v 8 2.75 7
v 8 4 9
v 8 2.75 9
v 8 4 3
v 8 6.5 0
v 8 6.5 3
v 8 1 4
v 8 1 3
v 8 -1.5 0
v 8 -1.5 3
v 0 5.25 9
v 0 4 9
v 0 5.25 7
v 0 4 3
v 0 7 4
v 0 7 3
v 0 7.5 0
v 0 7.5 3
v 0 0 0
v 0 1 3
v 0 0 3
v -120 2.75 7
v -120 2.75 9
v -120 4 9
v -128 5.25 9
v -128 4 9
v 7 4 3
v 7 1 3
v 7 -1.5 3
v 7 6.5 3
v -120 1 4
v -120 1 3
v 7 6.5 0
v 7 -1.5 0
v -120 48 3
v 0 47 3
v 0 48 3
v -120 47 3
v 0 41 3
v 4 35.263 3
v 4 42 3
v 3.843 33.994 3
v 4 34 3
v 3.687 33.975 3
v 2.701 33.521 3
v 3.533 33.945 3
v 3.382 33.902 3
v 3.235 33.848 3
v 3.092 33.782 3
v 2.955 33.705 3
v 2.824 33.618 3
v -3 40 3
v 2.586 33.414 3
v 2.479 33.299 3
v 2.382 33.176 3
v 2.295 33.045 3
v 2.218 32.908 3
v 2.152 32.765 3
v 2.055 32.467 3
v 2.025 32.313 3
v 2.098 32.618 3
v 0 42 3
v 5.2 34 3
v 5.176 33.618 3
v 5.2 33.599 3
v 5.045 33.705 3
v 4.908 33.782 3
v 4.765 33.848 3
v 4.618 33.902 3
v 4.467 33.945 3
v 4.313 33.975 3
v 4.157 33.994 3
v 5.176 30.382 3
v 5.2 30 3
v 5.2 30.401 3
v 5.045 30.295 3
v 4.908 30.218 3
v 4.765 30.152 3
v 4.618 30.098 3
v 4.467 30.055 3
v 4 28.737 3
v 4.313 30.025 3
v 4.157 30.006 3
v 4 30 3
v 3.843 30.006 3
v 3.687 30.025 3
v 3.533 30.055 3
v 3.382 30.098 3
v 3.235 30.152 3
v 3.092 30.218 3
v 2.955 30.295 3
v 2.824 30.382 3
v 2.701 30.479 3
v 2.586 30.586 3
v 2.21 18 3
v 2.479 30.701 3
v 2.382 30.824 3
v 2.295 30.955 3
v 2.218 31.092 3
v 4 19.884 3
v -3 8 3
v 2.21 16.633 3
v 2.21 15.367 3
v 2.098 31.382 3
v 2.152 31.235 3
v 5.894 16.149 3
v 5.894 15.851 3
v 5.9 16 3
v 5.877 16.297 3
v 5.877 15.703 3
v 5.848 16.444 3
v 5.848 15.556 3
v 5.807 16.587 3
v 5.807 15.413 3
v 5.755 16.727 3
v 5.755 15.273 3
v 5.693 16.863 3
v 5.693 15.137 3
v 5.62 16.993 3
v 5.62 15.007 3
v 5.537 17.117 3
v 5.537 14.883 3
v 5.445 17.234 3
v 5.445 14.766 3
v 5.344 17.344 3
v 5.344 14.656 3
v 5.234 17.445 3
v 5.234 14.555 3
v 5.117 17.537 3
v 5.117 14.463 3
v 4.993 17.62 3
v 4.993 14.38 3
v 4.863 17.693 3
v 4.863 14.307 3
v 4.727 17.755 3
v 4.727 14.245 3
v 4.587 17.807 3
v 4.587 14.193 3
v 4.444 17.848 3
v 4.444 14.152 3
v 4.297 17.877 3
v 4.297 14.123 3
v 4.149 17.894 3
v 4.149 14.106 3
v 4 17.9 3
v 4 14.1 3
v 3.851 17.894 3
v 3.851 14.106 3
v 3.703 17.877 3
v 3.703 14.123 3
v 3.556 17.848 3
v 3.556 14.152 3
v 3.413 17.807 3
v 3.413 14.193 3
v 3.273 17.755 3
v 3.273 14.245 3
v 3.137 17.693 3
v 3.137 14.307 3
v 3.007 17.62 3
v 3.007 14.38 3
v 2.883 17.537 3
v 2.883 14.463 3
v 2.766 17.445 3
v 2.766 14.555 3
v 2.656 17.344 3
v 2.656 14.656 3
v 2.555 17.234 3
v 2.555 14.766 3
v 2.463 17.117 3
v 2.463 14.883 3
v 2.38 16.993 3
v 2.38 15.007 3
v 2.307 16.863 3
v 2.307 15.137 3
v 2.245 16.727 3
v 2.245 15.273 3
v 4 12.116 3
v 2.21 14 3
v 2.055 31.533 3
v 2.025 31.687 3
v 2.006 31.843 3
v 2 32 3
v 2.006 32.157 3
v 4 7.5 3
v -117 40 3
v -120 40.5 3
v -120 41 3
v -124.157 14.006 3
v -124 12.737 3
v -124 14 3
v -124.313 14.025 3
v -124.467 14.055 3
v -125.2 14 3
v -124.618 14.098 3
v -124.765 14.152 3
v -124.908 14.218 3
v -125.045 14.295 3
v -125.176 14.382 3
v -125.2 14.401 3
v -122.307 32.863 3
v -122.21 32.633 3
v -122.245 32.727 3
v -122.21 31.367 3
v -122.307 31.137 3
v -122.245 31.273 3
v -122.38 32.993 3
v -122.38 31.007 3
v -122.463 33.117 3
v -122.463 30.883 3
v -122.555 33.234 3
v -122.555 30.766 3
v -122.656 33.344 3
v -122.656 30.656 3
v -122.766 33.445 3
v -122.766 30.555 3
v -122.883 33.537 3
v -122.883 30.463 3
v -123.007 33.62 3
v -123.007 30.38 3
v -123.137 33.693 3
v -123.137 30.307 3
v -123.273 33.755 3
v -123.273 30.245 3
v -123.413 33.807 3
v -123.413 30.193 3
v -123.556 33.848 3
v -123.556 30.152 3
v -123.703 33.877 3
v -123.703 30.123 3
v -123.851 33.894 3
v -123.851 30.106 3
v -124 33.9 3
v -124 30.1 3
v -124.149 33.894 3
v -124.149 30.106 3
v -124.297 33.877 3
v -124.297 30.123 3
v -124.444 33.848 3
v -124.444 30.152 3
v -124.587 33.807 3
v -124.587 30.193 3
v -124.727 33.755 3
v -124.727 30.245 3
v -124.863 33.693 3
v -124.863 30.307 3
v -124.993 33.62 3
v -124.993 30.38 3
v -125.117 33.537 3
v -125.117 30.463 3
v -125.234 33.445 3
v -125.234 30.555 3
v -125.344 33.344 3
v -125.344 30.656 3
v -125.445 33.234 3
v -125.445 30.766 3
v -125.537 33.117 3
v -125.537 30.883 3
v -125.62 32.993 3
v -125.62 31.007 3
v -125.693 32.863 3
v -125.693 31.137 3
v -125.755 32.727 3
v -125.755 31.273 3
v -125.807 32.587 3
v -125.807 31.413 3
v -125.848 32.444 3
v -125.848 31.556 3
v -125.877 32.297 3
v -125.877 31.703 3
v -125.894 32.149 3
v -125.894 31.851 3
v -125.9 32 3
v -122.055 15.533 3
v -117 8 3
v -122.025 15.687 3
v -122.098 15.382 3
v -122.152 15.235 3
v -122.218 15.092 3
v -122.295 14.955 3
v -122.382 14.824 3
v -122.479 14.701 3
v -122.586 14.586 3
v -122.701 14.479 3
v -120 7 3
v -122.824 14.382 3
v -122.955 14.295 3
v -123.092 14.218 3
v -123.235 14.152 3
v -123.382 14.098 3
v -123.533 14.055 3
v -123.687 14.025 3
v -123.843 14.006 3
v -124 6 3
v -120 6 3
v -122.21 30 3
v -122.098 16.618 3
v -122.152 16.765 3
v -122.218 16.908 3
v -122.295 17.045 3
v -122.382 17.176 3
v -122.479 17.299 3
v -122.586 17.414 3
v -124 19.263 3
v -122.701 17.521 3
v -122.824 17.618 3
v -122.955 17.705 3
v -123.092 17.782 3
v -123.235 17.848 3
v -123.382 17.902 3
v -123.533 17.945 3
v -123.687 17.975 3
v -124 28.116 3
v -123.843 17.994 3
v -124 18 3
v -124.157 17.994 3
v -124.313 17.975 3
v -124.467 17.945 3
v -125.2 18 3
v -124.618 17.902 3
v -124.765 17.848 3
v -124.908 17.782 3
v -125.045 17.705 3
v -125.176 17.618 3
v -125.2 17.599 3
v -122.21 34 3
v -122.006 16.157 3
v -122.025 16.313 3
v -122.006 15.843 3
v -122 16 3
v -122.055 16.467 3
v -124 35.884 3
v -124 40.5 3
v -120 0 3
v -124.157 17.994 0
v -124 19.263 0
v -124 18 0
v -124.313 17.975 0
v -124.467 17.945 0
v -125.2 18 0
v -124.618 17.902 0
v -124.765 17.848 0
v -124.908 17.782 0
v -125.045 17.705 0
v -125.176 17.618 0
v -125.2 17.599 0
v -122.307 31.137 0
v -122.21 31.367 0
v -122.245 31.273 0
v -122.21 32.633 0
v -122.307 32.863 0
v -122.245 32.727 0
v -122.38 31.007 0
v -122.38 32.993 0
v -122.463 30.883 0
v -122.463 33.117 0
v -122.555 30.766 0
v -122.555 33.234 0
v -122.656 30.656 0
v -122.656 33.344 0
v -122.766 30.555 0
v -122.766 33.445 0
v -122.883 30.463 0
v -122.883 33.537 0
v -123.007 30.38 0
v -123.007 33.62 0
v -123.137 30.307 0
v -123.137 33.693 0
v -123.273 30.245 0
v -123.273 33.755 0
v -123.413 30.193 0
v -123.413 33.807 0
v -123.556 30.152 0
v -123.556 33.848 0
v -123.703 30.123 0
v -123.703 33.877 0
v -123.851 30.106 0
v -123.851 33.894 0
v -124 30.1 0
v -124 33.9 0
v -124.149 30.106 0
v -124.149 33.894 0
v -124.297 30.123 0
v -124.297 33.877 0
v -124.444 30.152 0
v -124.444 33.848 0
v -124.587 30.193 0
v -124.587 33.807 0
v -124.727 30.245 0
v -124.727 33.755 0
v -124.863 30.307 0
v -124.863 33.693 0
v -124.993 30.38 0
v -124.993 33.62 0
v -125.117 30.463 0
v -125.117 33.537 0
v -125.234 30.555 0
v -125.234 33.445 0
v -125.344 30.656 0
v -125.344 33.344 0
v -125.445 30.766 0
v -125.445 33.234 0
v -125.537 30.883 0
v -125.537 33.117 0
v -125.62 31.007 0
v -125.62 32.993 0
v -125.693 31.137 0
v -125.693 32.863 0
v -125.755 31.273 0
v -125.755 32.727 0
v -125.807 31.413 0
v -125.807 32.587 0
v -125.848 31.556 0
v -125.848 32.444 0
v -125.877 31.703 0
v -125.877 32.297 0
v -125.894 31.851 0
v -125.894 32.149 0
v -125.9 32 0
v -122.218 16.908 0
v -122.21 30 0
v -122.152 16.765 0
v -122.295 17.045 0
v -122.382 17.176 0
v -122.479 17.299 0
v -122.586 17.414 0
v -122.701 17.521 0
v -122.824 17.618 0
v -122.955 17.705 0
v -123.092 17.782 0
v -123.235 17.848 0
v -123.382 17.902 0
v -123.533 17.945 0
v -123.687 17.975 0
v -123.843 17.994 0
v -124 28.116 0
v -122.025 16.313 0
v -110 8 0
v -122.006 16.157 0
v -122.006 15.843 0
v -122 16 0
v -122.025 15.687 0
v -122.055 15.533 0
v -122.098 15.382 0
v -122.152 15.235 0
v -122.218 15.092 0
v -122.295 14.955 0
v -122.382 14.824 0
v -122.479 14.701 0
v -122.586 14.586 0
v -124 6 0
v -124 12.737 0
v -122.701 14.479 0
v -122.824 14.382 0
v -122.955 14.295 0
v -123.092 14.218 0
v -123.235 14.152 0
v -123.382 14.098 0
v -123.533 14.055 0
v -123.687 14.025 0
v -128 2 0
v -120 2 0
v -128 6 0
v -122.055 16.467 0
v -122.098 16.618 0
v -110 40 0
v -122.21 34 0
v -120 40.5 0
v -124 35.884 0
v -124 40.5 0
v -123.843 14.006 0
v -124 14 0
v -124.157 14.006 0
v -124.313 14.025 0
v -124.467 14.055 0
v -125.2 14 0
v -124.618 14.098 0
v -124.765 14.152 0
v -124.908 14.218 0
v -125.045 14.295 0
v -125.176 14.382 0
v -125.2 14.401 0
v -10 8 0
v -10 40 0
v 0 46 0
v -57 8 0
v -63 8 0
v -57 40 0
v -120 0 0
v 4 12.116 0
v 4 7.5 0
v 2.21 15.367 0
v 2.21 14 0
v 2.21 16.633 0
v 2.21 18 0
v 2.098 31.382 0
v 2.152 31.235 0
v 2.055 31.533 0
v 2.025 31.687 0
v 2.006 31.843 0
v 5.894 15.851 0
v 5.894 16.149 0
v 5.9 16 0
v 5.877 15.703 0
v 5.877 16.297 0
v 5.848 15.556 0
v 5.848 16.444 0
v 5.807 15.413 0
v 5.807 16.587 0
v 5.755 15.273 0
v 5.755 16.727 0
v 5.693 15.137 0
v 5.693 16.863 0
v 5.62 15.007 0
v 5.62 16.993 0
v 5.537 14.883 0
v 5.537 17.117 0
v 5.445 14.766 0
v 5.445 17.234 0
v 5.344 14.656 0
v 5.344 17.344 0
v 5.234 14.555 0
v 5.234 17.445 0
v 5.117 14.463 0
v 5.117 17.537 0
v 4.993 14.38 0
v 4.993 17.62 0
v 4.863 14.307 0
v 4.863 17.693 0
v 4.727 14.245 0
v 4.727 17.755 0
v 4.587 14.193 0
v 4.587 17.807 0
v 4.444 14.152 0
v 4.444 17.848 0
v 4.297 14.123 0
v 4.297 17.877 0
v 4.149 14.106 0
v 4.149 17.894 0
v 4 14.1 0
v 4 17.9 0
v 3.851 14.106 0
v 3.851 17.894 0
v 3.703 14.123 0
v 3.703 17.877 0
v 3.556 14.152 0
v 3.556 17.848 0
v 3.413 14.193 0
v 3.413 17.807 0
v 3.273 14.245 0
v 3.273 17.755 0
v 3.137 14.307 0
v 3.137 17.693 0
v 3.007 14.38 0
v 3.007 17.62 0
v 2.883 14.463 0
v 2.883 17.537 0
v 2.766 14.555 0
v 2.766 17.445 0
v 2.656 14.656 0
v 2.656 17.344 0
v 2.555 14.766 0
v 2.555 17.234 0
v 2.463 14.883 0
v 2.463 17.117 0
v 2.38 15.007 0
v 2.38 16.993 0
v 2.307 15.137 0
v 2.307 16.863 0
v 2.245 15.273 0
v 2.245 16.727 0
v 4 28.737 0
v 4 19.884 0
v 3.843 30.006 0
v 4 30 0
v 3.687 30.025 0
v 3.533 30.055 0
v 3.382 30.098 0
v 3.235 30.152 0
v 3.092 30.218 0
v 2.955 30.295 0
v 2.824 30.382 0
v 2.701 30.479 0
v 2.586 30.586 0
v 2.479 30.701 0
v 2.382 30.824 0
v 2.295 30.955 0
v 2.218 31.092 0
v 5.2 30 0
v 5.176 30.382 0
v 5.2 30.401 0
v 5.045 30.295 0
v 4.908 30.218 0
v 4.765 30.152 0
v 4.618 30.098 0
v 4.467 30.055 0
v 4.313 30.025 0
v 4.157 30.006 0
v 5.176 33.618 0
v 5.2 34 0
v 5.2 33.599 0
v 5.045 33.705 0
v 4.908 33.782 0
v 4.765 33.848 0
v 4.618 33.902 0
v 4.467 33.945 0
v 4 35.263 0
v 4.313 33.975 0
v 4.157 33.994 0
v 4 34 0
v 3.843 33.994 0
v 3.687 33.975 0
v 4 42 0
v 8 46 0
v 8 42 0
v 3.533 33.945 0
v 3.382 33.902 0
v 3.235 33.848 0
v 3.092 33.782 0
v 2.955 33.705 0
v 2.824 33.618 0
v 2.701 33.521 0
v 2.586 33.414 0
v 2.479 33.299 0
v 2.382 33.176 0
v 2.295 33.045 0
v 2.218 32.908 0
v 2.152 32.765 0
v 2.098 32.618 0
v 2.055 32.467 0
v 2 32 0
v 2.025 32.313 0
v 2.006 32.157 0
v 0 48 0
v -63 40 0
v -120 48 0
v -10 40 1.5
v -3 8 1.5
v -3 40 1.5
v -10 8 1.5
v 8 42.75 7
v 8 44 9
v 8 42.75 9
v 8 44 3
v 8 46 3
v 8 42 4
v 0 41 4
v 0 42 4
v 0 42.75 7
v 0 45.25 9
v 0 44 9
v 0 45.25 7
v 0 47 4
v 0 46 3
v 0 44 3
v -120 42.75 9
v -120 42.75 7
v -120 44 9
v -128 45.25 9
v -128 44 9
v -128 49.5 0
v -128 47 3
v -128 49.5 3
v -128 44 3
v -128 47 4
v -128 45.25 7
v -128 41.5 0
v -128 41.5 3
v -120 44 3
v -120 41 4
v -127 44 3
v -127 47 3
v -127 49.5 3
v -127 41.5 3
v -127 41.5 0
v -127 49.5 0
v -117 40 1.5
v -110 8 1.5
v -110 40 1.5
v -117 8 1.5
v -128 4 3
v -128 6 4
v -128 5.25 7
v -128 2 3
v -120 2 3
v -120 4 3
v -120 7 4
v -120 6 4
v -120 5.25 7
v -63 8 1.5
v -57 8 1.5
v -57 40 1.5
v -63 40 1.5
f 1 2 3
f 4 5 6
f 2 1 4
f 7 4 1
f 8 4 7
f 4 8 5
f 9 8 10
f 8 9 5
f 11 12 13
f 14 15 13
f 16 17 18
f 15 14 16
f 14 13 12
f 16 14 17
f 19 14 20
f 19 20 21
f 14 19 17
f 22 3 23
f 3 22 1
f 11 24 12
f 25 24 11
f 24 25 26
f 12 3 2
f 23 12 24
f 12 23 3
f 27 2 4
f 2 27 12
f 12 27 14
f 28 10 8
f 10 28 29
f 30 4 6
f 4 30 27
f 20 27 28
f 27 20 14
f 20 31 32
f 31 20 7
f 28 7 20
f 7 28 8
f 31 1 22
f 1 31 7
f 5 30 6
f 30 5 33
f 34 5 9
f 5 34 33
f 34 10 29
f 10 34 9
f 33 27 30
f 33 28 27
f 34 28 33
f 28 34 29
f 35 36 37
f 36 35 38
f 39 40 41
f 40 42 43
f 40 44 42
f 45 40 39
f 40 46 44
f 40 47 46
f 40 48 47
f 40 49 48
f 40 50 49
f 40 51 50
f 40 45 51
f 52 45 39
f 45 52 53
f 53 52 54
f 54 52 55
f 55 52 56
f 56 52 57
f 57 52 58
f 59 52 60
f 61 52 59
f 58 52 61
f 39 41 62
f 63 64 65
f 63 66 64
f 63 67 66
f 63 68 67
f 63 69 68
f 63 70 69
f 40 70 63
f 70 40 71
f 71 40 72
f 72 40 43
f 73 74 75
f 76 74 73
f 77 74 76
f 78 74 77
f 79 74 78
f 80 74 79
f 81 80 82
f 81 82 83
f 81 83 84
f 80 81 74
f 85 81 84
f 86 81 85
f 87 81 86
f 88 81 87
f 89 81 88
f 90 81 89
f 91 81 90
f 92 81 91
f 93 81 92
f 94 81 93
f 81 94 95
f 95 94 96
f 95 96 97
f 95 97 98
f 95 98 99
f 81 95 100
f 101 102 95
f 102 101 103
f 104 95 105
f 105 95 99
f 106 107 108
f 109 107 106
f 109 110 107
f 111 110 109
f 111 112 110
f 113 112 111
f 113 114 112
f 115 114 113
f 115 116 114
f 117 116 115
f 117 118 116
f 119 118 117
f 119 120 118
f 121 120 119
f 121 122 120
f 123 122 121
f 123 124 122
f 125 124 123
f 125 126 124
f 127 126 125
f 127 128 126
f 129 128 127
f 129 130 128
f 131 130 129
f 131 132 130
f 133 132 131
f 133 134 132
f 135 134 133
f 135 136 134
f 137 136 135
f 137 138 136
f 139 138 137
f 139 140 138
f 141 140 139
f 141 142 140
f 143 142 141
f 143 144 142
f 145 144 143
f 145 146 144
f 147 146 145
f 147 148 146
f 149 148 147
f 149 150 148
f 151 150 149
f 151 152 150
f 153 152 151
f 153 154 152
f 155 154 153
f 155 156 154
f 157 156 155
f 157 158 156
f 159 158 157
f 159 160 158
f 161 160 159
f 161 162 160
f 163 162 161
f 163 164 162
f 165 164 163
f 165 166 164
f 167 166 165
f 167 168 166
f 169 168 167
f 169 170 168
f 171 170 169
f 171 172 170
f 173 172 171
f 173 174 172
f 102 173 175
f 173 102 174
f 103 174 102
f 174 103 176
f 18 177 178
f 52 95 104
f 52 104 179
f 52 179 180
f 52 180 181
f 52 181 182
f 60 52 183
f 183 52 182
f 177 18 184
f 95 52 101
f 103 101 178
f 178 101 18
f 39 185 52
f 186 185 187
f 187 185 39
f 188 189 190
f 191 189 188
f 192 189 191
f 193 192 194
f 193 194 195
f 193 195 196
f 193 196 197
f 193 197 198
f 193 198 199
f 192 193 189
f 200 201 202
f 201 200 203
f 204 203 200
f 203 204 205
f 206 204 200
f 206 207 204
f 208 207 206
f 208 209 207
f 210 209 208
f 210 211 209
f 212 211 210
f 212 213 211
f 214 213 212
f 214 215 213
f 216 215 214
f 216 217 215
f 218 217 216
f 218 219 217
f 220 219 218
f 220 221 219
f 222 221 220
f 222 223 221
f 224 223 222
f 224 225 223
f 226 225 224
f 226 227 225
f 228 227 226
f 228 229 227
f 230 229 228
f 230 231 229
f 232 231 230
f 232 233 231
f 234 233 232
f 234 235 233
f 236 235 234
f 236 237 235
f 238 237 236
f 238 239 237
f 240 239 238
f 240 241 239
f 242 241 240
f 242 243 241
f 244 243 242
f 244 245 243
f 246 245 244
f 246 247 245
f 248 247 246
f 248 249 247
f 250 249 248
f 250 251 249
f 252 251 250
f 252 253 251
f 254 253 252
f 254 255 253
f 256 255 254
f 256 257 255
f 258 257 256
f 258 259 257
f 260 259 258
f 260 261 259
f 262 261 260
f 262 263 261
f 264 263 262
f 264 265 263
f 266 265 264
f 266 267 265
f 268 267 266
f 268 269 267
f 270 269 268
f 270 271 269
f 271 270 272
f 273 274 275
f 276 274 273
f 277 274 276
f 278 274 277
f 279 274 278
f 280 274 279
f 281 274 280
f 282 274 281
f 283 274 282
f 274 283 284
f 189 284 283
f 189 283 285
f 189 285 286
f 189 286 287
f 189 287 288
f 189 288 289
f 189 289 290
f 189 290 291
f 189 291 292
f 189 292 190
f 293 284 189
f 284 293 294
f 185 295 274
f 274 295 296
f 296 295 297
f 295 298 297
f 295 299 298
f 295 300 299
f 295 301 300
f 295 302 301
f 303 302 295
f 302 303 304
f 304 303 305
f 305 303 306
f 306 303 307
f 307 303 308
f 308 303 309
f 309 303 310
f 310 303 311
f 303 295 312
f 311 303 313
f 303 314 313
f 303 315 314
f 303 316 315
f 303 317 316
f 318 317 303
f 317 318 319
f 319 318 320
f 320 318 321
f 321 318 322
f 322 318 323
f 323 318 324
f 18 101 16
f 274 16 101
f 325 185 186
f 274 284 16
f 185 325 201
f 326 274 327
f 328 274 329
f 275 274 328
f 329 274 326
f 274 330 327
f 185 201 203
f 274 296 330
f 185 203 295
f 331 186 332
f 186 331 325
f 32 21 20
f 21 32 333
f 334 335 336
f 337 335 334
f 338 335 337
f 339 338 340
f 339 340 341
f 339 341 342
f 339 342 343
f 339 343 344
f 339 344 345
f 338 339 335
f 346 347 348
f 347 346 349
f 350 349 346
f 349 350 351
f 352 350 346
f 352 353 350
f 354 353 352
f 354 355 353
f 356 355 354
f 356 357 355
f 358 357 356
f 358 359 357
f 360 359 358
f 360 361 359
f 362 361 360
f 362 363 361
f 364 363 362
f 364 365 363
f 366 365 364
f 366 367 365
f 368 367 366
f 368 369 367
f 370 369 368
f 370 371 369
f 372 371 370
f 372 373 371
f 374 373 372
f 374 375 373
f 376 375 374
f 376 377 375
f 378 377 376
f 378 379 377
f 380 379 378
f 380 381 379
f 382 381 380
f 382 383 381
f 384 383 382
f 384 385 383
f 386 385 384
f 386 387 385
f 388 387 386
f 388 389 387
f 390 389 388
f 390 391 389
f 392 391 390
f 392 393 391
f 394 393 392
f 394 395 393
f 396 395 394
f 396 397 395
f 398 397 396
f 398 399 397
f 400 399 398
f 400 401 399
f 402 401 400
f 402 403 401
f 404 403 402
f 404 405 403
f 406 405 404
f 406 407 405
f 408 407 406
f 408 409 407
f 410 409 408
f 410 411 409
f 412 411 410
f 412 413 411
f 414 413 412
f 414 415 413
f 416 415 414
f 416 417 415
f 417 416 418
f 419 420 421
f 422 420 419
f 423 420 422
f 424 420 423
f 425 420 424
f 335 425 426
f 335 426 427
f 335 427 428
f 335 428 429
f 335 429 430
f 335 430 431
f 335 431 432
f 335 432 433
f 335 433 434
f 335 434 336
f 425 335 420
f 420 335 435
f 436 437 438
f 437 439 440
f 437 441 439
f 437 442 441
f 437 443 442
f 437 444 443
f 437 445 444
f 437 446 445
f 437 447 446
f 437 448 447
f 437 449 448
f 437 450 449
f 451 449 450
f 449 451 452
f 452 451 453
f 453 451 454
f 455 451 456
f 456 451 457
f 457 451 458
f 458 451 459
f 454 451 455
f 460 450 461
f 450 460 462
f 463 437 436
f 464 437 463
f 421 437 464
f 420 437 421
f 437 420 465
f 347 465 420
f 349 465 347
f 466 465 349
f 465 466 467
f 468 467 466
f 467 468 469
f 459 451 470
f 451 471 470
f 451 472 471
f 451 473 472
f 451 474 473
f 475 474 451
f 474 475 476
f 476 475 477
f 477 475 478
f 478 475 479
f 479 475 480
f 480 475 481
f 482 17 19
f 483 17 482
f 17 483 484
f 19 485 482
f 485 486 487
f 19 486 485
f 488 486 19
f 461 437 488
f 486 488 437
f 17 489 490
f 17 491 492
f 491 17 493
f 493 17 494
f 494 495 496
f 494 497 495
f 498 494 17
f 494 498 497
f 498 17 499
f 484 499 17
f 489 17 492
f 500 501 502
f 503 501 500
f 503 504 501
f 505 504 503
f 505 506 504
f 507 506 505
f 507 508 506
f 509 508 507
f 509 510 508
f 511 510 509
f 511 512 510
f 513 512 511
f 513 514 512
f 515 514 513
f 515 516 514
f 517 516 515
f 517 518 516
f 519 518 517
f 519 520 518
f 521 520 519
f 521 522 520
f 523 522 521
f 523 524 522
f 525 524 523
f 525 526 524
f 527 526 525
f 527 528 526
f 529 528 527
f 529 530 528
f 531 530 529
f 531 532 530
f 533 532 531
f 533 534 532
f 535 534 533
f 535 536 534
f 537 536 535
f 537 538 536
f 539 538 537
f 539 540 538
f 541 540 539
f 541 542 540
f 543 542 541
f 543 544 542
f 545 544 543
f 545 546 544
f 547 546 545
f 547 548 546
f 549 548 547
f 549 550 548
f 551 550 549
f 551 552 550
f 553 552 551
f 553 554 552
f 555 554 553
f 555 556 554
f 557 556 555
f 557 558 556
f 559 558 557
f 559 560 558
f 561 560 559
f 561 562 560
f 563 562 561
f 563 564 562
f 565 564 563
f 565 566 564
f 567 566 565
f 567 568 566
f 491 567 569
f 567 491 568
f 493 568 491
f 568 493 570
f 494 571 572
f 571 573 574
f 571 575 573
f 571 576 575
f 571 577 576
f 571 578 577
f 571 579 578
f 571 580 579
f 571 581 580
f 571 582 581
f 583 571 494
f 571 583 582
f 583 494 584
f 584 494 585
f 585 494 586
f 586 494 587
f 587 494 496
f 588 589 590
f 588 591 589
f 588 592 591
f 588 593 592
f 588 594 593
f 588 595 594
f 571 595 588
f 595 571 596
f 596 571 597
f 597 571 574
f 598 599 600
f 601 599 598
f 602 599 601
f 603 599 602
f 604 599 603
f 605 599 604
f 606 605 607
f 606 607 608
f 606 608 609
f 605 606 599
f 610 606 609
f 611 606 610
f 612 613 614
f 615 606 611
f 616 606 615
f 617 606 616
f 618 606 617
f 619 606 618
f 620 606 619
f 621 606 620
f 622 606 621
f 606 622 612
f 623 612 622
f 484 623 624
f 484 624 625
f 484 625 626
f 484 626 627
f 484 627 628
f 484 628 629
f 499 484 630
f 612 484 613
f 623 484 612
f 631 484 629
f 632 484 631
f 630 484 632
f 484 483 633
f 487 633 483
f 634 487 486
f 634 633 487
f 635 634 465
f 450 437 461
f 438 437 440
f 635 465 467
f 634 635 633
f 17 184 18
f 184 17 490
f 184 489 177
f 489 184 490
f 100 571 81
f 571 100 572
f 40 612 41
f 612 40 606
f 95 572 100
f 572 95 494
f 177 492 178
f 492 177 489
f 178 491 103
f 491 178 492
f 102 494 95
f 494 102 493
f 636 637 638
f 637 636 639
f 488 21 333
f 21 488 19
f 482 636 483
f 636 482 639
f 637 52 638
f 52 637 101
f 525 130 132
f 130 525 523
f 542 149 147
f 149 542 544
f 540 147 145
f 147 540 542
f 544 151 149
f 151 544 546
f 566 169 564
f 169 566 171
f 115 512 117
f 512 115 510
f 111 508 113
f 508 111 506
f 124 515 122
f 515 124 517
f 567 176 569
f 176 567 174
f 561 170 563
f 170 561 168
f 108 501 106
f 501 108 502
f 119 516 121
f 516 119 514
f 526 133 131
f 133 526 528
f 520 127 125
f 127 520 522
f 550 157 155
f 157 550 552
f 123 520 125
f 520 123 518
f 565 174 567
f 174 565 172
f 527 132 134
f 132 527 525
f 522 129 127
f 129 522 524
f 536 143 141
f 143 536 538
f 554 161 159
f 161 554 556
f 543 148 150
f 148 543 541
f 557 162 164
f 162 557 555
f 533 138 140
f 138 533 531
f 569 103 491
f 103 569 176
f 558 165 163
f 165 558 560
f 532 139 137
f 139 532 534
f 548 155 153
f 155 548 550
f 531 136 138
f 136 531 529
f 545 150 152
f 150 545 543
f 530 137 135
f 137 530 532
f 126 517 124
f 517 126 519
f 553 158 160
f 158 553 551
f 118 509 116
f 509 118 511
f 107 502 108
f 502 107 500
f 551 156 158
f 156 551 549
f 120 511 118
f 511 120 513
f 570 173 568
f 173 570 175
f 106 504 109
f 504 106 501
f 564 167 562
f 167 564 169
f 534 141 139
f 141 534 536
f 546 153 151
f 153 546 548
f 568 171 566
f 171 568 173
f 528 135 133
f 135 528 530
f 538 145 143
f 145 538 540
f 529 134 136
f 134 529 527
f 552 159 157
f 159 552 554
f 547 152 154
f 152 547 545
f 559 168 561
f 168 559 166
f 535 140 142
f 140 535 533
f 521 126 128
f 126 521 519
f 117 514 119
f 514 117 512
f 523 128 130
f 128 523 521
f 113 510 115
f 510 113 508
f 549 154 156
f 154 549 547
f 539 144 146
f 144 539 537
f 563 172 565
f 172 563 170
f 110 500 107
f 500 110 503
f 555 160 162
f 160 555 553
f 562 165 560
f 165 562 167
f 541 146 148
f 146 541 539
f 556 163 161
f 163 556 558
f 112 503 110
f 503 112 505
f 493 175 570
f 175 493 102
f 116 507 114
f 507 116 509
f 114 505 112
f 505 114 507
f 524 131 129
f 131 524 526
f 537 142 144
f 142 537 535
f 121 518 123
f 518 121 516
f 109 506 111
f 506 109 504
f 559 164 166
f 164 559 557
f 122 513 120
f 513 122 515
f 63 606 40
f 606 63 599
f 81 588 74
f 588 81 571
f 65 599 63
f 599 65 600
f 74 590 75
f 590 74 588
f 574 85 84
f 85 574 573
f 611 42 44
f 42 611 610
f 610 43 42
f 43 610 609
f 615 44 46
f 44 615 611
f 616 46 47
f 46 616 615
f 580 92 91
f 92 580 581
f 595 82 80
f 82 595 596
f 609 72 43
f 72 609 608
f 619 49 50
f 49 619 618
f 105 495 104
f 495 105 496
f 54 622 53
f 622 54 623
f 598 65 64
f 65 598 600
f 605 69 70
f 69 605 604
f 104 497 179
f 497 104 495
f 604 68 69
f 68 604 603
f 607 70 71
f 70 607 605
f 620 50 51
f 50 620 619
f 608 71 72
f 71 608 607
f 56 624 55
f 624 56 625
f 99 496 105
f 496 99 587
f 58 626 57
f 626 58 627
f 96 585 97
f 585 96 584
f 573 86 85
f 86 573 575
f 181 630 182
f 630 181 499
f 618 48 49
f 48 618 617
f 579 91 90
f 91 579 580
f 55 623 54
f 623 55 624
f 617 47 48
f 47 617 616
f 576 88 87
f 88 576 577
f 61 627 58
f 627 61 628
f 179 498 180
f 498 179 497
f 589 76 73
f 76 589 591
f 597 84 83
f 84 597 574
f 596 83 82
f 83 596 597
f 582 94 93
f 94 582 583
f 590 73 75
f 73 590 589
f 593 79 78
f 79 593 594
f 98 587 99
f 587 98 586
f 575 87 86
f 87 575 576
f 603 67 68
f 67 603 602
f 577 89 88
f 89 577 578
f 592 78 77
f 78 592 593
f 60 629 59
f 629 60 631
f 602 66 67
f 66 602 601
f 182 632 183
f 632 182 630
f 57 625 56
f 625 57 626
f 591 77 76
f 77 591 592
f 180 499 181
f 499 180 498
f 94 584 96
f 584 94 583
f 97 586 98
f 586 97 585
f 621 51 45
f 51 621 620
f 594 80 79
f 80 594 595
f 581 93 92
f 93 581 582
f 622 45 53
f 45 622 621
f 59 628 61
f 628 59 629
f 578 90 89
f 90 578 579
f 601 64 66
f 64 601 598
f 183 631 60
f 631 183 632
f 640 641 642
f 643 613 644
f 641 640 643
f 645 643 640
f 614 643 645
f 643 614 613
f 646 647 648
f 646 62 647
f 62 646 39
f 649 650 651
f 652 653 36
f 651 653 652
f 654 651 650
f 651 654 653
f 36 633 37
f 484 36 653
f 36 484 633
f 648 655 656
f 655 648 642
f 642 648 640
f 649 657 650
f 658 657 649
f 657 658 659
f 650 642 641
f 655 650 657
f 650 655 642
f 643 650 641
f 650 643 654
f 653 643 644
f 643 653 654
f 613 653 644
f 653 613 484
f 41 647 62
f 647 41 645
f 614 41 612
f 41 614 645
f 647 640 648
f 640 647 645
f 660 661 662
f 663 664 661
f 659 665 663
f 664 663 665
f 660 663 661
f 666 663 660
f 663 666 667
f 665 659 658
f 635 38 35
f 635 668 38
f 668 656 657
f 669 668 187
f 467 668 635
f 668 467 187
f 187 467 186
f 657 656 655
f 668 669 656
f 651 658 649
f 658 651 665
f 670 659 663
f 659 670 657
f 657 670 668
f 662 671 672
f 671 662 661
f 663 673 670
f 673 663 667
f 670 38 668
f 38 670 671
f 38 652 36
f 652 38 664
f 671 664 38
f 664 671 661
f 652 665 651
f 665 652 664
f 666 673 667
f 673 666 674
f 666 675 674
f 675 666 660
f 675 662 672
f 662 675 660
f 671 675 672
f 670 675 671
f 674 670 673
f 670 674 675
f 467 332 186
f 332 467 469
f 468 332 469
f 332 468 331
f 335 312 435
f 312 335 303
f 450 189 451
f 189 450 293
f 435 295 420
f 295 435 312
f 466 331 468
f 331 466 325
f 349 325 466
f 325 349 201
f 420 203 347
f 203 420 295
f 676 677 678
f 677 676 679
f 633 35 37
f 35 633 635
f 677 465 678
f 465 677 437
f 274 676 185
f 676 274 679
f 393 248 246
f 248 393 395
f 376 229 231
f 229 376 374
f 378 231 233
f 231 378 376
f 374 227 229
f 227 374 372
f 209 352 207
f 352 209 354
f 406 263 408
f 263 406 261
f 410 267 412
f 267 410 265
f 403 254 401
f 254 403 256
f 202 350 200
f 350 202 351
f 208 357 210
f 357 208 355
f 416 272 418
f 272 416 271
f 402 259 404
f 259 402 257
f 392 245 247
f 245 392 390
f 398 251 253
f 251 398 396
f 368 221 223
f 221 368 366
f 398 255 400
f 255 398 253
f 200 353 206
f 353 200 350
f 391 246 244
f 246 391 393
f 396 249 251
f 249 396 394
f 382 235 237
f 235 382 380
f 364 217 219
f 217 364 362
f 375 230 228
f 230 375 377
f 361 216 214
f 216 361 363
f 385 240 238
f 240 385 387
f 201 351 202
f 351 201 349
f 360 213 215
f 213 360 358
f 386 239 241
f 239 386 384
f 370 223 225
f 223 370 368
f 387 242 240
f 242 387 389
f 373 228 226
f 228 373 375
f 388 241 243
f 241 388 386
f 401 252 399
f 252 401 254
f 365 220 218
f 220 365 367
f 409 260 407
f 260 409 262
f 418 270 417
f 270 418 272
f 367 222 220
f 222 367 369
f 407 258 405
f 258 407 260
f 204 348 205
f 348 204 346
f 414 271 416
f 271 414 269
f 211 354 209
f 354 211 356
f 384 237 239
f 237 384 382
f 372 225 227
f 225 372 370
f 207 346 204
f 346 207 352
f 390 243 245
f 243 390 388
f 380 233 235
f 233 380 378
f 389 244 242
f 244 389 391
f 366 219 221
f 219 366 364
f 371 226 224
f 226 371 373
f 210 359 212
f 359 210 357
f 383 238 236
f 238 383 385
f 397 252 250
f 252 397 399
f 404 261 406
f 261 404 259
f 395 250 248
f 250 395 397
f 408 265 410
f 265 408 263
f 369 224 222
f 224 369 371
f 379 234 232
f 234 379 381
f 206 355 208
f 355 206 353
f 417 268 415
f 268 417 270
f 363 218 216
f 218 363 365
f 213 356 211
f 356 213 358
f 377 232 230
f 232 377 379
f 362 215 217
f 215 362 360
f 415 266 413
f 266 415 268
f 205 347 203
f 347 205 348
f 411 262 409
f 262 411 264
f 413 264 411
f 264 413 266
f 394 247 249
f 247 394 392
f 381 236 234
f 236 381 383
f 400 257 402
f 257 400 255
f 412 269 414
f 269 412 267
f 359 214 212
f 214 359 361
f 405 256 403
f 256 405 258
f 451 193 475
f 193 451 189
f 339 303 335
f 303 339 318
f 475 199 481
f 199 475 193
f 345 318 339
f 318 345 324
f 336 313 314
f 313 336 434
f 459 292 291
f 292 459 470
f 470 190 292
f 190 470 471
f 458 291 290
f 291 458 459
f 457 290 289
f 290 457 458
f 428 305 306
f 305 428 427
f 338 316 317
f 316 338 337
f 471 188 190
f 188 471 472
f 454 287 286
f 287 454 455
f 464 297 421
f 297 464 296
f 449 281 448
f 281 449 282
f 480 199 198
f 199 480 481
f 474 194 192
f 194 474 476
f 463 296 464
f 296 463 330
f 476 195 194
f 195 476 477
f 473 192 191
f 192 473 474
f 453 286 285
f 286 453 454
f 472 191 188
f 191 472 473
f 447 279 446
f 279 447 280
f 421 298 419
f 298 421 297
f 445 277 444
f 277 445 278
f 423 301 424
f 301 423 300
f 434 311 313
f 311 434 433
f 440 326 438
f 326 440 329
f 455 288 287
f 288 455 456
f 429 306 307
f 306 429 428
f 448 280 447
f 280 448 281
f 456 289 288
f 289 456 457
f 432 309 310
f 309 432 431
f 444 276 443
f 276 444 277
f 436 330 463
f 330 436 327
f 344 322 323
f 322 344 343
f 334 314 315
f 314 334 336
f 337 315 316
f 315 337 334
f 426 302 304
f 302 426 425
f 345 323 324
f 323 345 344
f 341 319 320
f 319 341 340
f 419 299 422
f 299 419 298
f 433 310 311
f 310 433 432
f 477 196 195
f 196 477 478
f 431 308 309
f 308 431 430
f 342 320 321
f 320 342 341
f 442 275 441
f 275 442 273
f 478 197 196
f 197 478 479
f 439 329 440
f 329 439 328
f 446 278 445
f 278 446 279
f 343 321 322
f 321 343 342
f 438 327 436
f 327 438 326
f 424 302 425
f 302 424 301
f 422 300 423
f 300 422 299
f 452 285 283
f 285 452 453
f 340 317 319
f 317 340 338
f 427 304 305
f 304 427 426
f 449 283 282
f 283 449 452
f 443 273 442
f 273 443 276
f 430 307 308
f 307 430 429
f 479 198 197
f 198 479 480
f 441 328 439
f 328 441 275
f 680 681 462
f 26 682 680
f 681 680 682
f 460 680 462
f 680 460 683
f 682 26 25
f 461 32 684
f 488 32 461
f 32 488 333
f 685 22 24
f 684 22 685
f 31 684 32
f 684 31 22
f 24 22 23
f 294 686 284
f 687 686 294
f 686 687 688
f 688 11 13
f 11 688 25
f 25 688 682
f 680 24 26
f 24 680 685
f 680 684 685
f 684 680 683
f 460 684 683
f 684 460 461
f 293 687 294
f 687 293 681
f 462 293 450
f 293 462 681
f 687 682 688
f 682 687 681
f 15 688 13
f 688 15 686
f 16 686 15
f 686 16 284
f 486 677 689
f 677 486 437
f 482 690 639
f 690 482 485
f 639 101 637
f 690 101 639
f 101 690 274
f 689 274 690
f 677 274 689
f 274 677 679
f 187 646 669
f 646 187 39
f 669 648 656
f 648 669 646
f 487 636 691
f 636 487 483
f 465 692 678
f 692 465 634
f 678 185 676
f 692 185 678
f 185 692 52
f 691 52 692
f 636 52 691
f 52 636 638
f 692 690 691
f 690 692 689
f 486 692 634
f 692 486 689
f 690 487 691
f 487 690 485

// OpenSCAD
length = 120;

module rail_main(length) {
    poly = [[0,0],[0,8],[3,8],[3,7],[4,7],[7,5.25],[9,5.25],[9,2.75],[7,2.75],[4,1],[3,1],[3,0]];
    rotate([90,-90,180]) linear_extrude(length) polygon(poly);
}

module rail_endpoint_right() {
    poly = [[0,2],[0,6],[3,6],[3,4],[9,4],[9,2.75],[7,2.75],[4,2],[3,2]];
    rotate([90,-90,180]) linear_extrude(8) polygon(poly);
}

module rail_endpoint_left() {
    poly = [[3,8],[3,4],[9,4],[9,2.75],[7,2.75],[4,1],[3,1]];
    rotate([90,-90,180]) linear_extrude(8) polygon(poly);
    // support
    translate([-1.5,0,0]) cube([8,1,3], false);
}

module attach_poly(h) {
    linear_extrude(h) polygon([[0,0],[2,1.9],[6,1.9],[8,0]]);
}

module attach(l) {
    difference() {
        union() {
            cube([41,l,1.5], false);
            cube([41,3,3], false);
            difference() {
                translate ([7.5,-4,0]) cube([36,6,3], false);
                translate ([12,-4.11,-0.5]) attach_poly(4);
            }
            translate ([16,-4,0]) cylinder(3,1.90,1.90,false, $fn = 80);
            translate ([28,-3.3,0]) mirror([0,1,0]) attach_poly(3);
        }
        translate ([32,-4,-0.5]) cylinder(4,2,2,false, $fn = 80);
    }
}

module full_endpoint() {
    translate([0,-8,0]) rail_endpoint_left();
    translate([40,-8,0]) rail_endpoint_right();
    attach(10);
}

module barreau() {
    translate([8,0,0]) cube([36,6,1.5], false);
}

module main() {
    rail_main(length);
    translate([40,0,0]) rail_main(length);

    full_endpoint();

    translate([48,length,0]) rotate([180,180,0]) full_endpoint();

    translate([0,length/2-3,0]) barreau();
}

rotate([0,0,90]) main();
